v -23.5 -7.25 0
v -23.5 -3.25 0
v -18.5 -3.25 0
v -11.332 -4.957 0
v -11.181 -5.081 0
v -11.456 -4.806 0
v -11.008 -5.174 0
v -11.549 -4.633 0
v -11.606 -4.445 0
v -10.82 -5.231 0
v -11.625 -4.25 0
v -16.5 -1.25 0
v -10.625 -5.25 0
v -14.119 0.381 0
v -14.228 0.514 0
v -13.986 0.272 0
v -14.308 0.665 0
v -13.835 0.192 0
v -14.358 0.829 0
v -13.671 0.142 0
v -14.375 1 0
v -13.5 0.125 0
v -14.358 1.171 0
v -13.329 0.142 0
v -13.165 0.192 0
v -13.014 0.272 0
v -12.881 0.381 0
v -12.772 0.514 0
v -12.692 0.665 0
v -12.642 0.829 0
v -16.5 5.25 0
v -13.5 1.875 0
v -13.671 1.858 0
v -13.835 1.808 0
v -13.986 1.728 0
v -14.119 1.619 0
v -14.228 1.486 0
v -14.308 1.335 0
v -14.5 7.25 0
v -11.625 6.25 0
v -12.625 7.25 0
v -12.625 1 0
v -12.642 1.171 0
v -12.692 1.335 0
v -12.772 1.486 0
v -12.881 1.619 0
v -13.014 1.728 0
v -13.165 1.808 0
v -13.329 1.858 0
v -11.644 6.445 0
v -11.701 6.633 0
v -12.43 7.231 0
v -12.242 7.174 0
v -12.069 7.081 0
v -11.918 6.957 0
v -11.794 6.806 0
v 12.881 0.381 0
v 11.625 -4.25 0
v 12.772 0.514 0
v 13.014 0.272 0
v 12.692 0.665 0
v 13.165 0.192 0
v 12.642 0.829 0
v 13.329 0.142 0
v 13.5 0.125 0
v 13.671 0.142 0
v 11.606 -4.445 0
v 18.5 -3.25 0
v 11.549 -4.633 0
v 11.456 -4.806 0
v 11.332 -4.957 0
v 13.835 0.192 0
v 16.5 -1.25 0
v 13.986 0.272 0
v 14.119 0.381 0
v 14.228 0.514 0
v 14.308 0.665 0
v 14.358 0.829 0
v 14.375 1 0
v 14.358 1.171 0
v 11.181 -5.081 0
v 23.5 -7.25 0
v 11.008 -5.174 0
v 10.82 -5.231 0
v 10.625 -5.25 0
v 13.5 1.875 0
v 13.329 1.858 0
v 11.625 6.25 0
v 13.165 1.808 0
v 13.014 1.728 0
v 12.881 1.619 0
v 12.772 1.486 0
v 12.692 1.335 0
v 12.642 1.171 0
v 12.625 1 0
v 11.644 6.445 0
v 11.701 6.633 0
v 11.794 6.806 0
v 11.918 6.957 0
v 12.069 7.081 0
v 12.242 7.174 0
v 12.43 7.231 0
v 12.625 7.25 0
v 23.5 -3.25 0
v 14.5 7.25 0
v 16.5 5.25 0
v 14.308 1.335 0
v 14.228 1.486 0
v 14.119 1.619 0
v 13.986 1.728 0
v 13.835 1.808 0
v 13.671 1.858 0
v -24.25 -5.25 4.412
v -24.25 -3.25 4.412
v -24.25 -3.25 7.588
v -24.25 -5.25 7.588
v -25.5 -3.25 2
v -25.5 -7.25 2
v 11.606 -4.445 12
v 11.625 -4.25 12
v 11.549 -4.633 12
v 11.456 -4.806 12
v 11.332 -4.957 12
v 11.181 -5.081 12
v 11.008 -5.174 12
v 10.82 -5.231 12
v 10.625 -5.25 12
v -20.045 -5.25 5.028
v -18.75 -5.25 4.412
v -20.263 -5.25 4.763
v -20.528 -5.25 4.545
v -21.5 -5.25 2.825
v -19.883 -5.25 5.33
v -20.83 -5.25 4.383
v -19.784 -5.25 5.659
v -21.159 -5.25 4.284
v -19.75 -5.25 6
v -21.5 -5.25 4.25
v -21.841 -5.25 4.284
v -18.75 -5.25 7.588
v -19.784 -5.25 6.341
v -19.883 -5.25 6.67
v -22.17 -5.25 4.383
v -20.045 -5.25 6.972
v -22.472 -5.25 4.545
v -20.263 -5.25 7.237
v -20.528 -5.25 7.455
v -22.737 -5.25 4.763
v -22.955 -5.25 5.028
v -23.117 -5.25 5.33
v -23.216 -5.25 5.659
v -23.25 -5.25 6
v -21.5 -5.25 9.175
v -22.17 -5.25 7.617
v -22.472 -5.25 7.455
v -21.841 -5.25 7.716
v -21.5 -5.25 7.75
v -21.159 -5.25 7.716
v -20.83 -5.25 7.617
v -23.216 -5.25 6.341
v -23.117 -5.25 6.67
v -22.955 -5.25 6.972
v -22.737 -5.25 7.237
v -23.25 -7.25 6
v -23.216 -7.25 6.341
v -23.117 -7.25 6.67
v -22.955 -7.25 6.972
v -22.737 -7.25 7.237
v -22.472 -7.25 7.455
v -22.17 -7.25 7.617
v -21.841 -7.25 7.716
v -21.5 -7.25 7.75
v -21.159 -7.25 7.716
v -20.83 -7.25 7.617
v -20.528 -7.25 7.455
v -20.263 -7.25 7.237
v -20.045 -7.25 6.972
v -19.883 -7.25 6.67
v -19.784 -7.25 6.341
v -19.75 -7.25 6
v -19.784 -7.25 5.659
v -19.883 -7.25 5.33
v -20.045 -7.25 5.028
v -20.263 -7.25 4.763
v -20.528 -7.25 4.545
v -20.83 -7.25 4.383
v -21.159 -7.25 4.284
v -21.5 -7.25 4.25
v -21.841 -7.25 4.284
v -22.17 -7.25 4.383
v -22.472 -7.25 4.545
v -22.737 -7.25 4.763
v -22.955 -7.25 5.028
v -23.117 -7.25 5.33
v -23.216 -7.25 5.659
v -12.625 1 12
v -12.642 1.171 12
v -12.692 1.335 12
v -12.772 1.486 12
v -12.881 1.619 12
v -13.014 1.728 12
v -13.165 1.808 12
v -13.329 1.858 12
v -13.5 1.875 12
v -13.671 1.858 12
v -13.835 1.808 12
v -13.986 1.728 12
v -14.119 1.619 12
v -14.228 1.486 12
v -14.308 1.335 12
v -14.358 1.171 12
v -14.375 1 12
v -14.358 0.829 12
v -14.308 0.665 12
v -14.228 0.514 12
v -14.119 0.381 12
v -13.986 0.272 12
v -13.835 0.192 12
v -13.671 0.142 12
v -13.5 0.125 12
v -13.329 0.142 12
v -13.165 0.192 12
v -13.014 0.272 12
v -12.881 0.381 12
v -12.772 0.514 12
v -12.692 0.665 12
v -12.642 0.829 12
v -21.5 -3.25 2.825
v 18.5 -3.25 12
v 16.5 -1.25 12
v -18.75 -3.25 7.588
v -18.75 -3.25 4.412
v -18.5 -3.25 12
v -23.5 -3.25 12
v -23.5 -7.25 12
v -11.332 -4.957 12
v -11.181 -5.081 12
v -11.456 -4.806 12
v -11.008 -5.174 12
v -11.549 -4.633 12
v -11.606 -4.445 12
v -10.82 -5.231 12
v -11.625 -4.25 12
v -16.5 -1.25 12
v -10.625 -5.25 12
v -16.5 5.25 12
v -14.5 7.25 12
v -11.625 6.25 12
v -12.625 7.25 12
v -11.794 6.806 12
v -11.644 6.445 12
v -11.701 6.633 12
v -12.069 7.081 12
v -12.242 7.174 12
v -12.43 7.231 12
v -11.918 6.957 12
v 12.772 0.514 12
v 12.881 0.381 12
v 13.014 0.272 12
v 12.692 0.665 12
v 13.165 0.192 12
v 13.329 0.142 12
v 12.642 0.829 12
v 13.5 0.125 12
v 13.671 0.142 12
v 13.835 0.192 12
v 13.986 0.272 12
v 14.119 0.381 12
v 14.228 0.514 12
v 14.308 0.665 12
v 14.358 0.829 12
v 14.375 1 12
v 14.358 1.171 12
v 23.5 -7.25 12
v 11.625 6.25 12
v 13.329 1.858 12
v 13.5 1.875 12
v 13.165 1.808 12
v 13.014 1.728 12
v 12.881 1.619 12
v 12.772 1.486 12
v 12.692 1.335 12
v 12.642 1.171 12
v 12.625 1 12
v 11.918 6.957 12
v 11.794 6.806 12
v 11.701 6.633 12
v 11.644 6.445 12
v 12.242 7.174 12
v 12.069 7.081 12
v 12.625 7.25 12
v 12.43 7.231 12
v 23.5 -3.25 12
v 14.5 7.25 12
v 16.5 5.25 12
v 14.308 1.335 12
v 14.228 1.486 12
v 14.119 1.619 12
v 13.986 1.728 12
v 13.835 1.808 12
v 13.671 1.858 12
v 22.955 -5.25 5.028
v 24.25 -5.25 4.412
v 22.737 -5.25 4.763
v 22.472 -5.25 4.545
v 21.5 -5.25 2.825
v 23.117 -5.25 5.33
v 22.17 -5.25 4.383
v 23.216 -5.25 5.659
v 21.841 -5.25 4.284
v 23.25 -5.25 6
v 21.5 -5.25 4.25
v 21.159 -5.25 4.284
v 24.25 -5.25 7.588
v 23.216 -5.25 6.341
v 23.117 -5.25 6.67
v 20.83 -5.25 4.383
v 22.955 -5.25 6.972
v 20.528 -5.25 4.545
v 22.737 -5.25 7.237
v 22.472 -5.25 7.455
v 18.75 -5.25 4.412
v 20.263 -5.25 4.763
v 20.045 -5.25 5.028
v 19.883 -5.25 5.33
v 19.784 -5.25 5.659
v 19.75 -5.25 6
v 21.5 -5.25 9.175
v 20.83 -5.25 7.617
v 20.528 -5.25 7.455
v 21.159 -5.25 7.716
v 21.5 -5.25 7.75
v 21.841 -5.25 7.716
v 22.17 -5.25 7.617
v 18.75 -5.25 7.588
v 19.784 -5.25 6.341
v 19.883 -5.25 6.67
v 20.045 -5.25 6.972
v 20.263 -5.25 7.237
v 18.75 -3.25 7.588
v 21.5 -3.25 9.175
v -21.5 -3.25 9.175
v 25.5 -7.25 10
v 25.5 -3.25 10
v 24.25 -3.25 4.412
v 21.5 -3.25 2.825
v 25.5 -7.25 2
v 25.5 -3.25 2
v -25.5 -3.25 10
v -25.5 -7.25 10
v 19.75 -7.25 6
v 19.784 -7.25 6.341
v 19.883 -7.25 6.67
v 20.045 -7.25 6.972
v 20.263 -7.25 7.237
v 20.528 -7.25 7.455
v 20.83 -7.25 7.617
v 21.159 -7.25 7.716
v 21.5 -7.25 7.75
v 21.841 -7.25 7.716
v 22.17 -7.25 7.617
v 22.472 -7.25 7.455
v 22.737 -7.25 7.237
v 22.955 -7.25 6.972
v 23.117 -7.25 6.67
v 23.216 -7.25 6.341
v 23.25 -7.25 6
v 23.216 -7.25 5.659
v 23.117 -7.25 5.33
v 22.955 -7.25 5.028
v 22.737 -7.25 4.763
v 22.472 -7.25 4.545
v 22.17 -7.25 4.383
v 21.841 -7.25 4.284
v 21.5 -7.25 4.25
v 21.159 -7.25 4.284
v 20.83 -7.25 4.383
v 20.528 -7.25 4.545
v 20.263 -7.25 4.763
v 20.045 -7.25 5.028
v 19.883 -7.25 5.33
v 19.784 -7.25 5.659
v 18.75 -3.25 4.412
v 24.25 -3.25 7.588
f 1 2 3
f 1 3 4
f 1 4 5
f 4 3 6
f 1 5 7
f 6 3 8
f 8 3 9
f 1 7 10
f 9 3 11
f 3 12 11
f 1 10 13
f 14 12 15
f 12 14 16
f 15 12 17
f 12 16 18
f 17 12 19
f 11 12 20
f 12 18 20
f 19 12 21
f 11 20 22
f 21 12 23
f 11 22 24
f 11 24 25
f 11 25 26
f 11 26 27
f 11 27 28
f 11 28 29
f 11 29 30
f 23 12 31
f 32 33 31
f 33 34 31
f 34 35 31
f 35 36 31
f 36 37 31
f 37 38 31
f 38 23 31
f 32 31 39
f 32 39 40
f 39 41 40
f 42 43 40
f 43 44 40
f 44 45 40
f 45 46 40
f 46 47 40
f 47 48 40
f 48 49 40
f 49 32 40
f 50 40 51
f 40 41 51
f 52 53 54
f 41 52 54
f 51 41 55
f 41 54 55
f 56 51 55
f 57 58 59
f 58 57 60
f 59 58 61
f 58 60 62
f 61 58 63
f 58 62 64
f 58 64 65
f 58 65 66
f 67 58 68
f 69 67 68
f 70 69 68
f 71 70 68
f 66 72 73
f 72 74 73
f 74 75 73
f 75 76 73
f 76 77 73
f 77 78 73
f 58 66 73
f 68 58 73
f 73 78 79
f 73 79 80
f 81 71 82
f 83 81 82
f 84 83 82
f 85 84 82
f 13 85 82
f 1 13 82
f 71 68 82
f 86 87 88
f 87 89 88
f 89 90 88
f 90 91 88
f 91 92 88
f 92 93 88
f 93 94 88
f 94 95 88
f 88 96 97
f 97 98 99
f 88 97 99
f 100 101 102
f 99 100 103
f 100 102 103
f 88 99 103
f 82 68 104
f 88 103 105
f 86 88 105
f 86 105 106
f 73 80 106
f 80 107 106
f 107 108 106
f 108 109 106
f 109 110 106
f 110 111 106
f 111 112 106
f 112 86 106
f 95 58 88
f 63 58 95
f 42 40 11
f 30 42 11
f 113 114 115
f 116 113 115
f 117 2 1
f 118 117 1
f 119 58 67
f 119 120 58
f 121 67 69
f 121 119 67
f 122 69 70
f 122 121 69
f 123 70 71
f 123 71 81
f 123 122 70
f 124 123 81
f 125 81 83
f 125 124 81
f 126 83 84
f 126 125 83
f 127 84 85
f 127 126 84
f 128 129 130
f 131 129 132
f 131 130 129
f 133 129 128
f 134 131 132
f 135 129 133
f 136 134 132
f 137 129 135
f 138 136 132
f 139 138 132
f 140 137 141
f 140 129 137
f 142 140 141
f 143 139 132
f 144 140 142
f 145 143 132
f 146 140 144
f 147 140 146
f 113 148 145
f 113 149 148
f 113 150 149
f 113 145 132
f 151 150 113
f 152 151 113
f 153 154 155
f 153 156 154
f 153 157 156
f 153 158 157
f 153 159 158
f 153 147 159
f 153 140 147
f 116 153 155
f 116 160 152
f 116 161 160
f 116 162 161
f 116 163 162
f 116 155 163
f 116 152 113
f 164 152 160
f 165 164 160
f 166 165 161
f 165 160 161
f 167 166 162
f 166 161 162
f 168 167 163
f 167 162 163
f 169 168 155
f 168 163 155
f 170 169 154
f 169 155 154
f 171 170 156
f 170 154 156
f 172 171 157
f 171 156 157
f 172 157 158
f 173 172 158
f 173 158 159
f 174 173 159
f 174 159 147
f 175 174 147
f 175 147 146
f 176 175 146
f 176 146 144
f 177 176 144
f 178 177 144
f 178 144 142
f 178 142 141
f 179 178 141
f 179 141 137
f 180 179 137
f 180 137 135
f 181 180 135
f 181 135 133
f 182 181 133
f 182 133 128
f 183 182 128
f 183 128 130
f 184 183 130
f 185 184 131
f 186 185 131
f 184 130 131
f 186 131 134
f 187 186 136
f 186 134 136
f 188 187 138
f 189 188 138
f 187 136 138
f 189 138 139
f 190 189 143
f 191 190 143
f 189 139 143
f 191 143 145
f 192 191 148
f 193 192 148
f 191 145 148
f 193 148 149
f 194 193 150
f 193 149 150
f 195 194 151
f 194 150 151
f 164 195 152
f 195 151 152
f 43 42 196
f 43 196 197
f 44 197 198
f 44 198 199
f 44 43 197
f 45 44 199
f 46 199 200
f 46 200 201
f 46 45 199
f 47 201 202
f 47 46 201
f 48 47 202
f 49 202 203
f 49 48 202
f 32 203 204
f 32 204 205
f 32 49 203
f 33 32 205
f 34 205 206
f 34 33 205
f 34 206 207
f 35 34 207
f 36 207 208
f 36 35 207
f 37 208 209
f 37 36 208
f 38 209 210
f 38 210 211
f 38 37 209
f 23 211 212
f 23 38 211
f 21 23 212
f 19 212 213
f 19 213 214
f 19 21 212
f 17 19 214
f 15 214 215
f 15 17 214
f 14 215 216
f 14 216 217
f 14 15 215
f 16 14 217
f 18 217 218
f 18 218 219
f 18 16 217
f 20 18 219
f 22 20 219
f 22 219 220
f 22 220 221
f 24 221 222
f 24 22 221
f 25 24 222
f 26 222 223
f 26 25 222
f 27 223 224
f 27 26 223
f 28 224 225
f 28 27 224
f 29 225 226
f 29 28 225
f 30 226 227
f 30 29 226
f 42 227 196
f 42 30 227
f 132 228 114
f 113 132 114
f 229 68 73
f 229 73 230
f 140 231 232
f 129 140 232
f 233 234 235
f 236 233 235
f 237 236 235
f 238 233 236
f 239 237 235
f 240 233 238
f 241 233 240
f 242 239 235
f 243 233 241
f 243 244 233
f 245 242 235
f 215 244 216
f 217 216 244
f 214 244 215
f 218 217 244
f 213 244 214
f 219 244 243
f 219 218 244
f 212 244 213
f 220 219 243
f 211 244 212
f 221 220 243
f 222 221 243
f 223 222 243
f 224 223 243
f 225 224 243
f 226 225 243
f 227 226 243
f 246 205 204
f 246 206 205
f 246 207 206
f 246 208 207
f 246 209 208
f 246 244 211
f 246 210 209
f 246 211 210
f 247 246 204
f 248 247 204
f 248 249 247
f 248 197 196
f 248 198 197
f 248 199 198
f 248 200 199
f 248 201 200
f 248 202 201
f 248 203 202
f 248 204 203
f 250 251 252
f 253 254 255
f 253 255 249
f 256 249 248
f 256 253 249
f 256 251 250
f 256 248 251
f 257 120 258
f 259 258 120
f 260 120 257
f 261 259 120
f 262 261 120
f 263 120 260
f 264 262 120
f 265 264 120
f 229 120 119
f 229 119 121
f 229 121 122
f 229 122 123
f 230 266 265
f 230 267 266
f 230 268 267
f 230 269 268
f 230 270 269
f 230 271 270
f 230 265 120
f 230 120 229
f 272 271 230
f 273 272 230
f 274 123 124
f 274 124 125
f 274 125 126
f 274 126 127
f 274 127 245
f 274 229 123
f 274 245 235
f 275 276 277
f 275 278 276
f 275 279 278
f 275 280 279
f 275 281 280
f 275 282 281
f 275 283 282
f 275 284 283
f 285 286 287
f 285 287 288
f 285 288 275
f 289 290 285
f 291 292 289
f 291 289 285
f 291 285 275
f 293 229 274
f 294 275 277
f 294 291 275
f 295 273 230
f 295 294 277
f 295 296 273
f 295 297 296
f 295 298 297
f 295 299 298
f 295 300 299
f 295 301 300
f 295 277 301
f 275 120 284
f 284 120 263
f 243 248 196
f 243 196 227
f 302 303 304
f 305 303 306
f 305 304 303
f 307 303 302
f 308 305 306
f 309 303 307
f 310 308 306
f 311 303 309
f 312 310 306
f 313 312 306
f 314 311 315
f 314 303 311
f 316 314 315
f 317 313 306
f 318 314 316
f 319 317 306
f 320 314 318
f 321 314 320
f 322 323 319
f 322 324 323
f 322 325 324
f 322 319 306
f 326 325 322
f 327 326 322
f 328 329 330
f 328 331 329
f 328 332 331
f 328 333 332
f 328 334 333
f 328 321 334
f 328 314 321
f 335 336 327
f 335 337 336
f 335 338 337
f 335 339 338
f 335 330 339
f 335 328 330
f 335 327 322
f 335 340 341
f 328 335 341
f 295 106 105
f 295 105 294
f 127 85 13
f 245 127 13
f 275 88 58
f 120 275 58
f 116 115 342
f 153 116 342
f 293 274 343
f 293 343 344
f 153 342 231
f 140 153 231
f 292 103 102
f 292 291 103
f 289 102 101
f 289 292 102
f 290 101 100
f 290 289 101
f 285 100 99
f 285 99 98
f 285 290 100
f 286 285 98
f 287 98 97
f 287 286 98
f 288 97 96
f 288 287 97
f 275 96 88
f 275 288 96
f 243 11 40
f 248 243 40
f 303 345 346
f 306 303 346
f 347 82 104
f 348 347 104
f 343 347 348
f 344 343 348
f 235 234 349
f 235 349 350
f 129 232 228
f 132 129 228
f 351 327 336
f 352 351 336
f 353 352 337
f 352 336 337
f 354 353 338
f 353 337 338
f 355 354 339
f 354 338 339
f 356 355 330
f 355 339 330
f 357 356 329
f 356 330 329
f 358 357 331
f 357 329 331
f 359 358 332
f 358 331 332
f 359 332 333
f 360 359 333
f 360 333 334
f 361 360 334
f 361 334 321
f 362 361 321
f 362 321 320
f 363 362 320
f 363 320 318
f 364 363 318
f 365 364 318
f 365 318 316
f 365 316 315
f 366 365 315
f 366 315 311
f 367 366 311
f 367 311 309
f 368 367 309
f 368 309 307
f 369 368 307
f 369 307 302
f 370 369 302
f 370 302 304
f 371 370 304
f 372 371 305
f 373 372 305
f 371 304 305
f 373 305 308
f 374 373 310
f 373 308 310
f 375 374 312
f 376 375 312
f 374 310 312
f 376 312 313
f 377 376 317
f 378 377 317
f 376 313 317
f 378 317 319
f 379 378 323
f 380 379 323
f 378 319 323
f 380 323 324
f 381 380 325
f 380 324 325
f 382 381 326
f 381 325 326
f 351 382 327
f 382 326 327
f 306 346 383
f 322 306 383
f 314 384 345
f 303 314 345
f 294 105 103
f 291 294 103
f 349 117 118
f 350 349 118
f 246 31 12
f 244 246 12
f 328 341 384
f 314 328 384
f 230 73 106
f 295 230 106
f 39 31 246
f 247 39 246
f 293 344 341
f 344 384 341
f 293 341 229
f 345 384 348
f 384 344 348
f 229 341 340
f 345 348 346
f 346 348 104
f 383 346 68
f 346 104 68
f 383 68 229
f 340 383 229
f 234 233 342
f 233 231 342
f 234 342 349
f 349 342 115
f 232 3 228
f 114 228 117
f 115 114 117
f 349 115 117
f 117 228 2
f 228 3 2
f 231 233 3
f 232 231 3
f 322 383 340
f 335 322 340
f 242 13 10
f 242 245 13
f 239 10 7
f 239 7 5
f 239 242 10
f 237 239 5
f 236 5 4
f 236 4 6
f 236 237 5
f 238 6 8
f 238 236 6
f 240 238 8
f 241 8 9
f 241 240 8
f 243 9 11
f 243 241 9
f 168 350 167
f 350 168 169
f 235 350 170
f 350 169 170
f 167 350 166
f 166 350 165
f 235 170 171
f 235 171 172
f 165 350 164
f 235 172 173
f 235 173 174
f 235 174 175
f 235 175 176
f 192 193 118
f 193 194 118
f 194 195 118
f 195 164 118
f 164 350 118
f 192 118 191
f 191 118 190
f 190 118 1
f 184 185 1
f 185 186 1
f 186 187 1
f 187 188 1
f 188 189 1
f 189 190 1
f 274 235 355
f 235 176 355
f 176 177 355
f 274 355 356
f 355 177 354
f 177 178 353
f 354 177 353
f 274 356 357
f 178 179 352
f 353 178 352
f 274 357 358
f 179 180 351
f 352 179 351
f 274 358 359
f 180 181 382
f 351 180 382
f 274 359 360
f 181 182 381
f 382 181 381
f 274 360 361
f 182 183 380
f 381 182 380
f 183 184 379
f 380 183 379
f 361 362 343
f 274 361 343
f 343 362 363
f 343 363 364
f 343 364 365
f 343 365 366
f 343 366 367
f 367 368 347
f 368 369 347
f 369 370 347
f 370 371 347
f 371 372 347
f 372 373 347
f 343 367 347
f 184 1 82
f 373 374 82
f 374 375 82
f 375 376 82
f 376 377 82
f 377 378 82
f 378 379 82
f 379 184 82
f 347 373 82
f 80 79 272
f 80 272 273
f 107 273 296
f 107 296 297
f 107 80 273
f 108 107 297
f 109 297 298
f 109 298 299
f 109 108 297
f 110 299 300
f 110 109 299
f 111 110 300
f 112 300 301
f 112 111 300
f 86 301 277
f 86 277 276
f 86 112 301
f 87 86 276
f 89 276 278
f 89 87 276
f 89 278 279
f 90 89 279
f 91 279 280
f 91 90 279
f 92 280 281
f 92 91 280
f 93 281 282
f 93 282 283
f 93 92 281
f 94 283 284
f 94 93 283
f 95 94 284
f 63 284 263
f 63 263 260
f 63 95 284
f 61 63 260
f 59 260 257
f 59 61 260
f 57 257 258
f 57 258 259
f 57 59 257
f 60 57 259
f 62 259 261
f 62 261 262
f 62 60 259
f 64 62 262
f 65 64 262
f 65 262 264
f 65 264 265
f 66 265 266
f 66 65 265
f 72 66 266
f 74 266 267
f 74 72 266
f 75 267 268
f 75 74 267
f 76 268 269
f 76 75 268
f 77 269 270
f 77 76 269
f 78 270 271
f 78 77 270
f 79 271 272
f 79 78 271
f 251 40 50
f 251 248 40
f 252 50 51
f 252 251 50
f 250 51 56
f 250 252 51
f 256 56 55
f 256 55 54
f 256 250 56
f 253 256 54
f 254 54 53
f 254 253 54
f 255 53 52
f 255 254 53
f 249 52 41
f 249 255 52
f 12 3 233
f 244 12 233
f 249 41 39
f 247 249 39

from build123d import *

# Parameters (mm, degrees)
F0_R     = 0.875
F1_DEPTH = 12
F2_SIZE  = 2
F3_R     = 1.75
F4_DEPTH = 4
F5_DEPTH = 2
F6_R     = 1


with BuildPart() as f1:
    # F0 (on Top) → F1 (new body)
    with BuildSketch(Plane.XY):
        Polygon((11.625, -5.25), (-11.625, -5.25), (-16.5, -5.25), (-16.5, -7.25), (16.5, -7.25), (16.5, -5.25), align=None)
        Polygon((-16.5, -5.25), (-16.5, -3.25), (-25.5, -3.25), (-25.5, -7.25), (-16.5, -7.25), align=None)
        Polygon((25.5, -3.25), (16.5, -3.25), (16.5, -5.25), (16.5, -7.25), (25.5, -7.25), align=None)
        Polygon((-11.625, 7.25), (-16.5, 7.25), (-16.5, -3.25), (-16.5, -5.25), (-11.625, -5.25), align=None)
        with Locations((-13.5, 1)):
            Circle(F0_R, mode=Mode.SUBTRACT)
        Polygon((16.5, 7.25), (11.625, 7.25), (11.625, -5.25), (16.5, -5.25), (16.5, -3.25), align=None)
        with Locations((13.5, 1)):
            Circle(F0_R, mode=Mode.SUBTRACT)
    extrude(amount=F1_DEPTH)

    # F2
    f2_edges = [f1.edges().sort_by_distance(p)[0] for p in [
        (-16.5, -3.25, 6),
        (16.5, -3.25, 6),
        (25.5, -5.25, 12),
        (25.5, -5.25, 0),
        (-25.5, -5.25, 12),
        (-25.5, -5.25, 0),
        (16.5, 7.25, 6),
        (-16.5, 7.25, 6),
    ]]
    chamfer(f2_edges, length=F2_SIZE)

    # F3 (on face) → F4 (cut, through all)
    with BuildSketch(Plane(origin=(0, -3.25, 0), x_dir=(-1, 0, 0), z_dir=(0, 1, 0))):
        with Locations((21.5, 6)):
            Circle(F3_R)
        with Locations((-21.5, 6)):
            Circle(F3_R)
    extrude(amount=-F4_DEPTH, mode=Mode.SUBTRACT)

    # F3 (on face) → F5 (cut)
    with BuildSketch(Plane(origin=(0, -3.25, 0), x_dir=(-1, 0, 0), z_dir=(0, 1, 0))):
        Polygon((-18.75, 4.4122867597), (-18.75, 7.5877132403), (-21.5, 9.1754264805), (-24.25, 7.5877132403), (-24.25, 4.4122867597), (-21.5, 2.8245735195), align=None)
        with Locations((-21.5, 6)):
            Circle(F3_R, mode=Mode.SUBTRACT)
        Polygon((18.75, 7.5877132403), (18.75, 4.4122867597), (21.5, 2.8245735195), (24.25, 4.4122867597), (24.25, 7.5877132403), (21.5, 9.1754264805), align=None)
        with Locations((21.5, 6)):
            Circle(F3_R, mode=Mode.SUBTRACT)
    extrude(amount=-F5_DEPTH, mode=Mode.SUBTRACT)

    # F6
    f6_edges = [f1.edges().sort_by_distance(p)[0] for p in [
        (11.625, -5.25, 6),
        (-11.625, -5.25, 6),
        (-11.625, 7.25, 6),
        (11.625, 7.25, 6),
    ]]
    fillet(f6_edges, radius=F6_R)


solid = f1.part
